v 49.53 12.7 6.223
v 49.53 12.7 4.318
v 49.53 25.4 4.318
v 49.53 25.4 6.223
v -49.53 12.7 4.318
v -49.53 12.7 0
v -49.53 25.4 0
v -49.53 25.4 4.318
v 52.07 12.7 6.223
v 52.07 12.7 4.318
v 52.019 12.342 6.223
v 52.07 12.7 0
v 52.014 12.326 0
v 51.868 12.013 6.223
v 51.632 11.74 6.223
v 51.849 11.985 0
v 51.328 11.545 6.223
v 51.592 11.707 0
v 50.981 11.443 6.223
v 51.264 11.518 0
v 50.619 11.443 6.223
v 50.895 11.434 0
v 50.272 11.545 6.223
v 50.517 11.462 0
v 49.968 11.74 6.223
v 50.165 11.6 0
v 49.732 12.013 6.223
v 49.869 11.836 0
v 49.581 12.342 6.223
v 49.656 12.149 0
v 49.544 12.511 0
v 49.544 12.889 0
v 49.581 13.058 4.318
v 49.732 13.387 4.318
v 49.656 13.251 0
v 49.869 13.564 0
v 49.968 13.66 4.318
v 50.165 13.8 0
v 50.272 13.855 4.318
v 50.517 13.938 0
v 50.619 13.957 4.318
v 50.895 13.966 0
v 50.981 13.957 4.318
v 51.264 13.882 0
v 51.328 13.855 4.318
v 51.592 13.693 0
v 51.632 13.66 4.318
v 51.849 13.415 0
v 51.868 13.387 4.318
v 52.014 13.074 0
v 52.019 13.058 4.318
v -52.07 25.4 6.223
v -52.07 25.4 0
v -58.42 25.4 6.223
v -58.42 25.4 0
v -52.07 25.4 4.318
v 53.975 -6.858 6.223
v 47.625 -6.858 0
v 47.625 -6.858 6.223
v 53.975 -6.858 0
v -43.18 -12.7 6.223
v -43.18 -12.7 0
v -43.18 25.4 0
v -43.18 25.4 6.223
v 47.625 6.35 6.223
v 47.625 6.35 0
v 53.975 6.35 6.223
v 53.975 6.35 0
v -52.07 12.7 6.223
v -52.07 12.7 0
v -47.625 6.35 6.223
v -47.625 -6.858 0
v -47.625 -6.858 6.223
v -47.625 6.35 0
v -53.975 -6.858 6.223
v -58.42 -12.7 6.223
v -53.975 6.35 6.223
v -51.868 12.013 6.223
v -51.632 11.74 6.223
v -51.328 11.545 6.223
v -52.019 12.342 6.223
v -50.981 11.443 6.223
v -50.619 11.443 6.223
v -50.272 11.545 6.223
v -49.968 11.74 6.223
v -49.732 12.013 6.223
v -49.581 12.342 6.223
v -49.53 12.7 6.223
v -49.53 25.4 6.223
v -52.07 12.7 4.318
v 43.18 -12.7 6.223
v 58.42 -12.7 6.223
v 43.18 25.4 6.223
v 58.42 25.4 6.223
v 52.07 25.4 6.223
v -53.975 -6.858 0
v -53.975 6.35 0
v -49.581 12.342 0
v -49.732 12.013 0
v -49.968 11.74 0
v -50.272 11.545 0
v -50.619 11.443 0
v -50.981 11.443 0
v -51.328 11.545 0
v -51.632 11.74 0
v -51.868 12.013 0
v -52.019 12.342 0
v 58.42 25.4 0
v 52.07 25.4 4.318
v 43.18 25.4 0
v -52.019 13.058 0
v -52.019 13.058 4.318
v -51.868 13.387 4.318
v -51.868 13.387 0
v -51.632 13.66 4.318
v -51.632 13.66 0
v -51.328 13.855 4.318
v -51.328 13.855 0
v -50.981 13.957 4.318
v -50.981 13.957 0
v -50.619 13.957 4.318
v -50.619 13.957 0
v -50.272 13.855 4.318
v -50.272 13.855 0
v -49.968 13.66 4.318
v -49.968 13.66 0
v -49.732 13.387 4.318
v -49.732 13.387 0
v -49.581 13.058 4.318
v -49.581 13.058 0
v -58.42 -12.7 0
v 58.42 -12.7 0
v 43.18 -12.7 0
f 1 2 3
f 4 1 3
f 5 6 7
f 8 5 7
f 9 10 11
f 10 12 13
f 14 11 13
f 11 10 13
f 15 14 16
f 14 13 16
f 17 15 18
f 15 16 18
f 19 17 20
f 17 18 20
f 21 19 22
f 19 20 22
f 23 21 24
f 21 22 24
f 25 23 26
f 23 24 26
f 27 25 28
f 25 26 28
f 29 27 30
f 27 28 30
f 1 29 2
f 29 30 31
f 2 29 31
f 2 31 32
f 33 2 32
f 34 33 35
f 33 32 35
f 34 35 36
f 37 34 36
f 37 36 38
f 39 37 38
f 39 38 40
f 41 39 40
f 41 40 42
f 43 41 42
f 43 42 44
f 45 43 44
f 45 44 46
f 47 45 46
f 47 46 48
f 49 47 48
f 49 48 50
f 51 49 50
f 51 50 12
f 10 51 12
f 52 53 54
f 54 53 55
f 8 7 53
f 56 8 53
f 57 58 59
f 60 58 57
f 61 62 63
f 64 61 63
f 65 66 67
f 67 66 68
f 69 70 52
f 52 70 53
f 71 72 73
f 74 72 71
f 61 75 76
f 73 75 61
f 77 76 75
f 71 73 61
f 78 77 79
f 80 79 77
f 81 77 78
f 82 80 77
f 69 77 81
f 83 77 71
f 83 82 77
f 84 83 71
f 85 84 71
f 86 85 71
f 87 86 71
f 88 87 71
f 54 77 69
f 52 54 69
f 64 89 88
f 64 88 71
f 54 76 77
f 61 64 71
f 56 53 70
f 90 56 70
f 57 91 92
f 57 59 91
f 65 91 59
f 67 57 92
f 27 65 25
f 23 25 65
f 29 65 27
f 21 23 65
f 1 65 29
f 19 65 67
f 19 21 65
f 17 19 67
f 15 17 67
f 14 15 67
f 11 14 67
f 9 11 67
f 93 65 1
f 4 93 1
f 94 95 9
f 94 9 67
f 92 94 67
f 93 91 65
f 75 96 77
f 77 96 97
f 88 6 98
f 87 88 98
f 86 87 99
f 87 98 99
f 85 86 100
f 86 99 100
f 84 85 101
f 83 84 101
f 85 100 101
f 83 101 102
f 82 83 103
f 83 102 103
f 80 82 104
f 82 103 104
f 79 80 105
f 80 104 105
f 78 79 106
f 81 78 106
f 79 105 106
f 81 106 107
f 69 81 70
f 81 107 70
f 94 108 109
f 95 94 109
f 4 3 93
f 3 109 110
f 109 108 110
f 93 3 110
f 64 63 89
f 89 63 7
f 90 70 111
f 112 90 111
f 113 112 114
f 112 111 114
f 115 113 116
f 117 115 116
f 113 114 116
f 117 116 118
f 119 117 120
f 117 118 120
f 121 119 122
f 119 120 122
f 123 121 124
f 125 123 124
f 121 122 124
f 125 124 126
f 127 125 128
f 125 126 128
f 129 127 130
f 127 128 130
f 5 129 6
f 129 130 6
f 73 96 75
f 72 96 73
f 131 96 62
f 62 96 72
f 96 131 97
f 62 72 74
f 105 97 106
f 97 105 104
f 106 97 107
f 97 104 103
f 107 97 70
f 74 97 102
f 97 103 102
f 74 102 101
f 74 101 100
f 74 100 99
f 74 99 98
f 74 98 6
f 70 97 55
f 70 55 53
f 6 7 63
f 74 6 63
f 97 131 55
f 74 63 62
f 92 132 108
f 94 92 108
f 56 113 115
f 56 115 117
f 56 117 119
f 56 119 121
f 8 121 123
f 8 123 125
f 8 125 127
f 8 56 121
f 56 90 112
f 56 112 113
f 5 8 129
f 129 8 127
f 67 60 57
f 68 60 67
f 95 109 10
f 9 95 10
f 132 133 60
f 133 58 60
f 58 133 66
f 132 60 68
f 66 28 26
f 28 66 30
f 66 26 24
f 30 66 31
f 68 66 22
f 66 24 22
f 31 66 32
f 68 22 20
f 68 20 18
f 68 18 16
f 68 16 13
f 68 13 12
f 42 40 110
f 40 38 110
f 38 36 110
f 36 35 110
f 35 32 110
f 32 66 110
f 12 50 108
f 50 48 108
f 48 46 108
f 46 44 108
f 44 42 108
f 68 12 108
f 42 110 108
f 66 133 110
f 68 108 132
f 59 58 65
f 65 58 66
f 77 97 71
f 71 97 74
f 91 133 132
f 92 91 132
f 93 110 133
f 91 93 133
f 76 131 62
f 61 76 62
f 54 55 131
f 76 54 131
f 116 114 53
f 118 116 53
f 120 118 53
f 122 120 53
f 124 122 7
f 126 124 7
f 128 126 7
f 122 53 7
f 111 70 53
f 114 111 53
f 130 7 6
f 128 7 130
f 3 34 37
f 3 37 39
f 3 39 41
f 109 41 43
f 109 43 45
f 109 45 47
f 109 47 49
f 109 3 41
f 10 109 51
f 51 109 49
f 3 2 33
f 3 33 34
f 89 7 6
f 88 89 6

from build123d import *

# Parameters (mm, degrees)
F0_W     = 6.35
F0_H     = 13.208
F1_DEPTH = 6.223
F2_DEPTH = 4.318


with BuildPart() as f1:
    # F0 (on Top) → F1 (new body)
    with BuildSketch(Plane.XY):
        with BuildLine():
            Line((43.18, -12.7), (58.42, -12.7))
            Line((58.42, -12.7), (58.42, 25.4))
            Line((58.42, 25.4), (52.07, 25.4))
            Line((52.07, 25.4), (52.07, 12.7))
            ThreePointArc((52.07, 12.7), (50.8, 11.43), (49.53, 12.7))
            Line((49.53, 12.7), (49.53, 25.4))
            Line((49.53, 25.4), (43.18, 25.4))
            Line((43.18, 25.4), (43.18, -12.7))
        make_face()
        with Locations((50.8, -0.254)):
            Rectangle(F0_W, F0_H, mode=Mode.SUBTRACT)
    extrude(amount=F1_DEPTH)

    # F0 (on Top) → F2 (join)
    with BuildSketch(Plane.XY):
        with BuildLine():
            Line((52.07, 12.7), (52.07, 25.4))
            Line((52.07, 25.4), (49.53, 25.4))
            Line((49.53, 25.4), (49.53, 12.7))
            ThreePointArc((49.53, 12.7), (50.8, 13.97), (52.07, 12.7))
        make_face()
    extrude(amount=F2_DEPTH)


with BuildPart() as f1b:
    # F0 (on Top) → F1, piece 2 (new body)
    with BuildSketch(Plane.XY):
        with BuildLine():
            Line((-58.42, 25.4), (-58.42, -12.7))
            Line((-58.42, -12.7), (-43.18, -12.7))
            Line((-43.18, -12.7), (-43.18, 25.4))
            Line((-43.18, 25.4), (-49.53, 25.4))
            Line((-49.53, 25.4), (-49.53, 12.7))
            ThreePointArc((-49.53, 12.7), (-50.8, 11.43), (-52.07, 12.7))
            Line((-52.07, 12.7), (-52.07, 25.4))
            Line((-52.07, 25.4), (-58.42, 25.4))
        make_face()
        with Locations((-50.8, -0.254)):
            Rectangle(F0_W, F0_H, mode=Mode.SUBTRACT)
    extrude(amount=F1_DEPTH)


with BuildPart() as f2:
    # F0 (on Top) → F2, piece 2 (new body)
    with BuildSketch(Plane.XY):
        with BuildLine():
            Line((-49.53, 25.4), (-52.07, 25.4))
            Line((-52.07, 25.4), (-52.07, 12.7))
            ThreePointArc((-52.07, 12.7), (-50.8, 13.97), (-49.53, 12.7))
            Line((-49.53, 12.7), (-49.53, 25.4))
        make_face()
    extrude(amount=F2_DEPTH)


solid = Compound([f1.part, f1b.part, f2.part])
